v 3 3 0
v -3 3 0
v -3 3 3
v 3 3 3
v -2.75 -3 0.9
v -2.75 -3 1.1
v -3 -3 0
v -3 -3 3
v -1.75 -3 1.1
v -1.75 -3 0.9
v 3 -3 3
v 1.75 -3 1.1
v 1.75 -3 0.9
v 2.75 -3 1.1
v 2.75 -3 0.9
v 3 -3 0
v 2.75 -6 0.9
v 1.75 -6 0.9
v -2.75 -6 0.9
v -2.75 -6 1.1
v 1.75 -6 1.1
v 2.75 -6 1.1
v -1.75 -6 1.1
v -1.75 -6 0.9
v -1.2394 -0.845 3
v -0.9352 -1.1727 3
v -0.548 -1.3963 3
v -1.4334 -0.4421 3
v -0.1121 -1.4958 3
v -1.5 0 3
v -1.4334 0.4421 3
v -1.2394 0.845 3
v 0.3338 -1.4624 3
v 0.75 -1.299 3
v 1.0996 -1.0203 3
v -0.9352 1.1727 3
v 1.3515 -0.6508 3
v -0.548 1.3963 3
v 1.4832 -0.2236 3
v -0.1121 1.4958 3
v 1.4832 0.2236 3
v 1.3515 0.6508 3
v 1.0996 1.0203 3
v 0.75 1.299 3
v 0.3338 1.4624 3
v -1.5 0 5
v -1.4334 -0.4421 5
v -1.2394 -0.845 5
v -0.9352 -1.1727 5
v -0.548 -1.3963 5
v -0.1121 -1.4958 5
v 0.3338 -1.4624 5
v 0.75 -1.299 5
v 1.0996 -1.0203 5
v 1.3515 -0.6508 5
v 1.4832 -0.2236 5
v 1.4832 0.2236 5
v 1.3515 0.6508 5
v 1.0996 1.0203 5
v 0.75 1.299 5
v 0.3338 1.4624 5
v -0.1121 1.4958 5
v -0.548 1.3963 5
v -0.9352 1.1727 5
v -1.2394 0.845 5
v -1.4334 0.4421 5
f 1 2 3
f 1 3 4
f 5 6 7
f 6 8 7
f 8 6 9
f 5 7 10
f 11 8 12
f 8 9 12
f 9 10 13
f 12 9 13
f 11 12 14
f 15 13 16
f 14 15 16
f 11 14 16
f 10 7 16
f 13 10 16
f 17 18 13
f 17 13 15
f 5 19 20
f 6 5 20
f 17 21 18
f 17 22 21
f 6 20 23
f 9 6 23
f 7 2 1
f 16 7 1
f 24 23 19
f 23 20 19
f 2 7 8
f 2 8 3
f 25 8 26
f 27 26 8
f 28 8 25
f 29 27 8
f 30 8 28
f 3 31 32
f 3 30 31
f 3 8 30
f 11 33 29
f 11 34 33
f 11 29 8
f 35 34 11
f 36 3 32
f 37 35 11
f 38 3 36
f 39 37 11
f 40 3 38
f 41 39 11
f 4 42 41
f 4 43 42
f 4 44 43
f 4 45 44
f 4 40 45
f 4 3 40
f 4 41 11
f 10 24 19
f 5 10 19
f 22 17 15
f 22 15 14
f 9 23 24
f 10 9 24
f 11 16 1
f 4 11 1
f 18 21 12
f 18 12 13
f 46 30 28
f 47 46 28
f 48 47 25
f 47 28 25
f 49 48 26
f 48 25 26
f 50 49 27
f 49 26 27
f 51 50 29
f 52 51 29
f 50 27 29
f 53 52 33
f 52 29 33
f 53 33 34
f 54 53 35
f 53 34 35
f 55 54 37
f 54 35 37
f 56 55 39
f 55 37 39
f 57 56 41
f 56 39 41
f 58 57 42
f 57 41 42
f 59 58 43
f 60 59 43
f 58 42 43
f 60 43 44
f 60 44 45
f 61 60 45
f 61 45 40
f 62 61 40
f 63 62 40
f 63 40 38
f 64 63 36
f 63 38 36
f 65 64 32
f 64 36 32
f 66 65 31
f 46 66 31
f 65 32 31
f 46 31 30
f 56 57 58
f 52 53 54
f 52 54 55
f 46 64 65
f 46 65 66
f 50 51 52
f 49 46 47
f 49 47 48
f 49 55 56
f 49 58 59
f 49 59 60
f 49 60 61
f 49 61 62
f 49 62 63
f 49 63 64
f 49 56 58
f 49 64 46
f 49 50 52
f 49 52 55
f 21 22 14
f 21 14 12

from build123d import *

# Parameters (mm, degrees)
SKETCH_1_W      = 6
SKETCH_1_H      = 6
EXTRUDE_1_DEPTH = 3
SKETCH_2_R      = 1.5
EXTRUDE_2_DEPTH = 2
SKETCH_4_W      = 1
SKETCH_4_H      = 0.2


with BuildPart() as part:
    # 草图1 → 凸台-拉伸1 (new body)
    with BuildSketch(Plane.XY):
        Rectangle(SKETCH_1_W, SKETCH_1_H)
    extrude(amount=EXTRUDE_1_DEPTH)

    # 草图2 → 凸台-拉伸2 (add)
    with BuildSketch(Plane.XY.offset(3)):
        with Locations(Location((0, 0, 0), (0, 0, 180))):
            Circle(SKETCH_2_R)
    extrude(amount=EXTRUDE_2_DEPTH)

    # 扫描3: sweep along a path in 草图6
    with BuildLine(Plane(origin=(2.25, 0, 0), x_dir=(0, 0, -1), z_dir=(1, 0, 0))) as sweep_3_path:
        Line((-1.1, -3), (-1.1, -6))
    # 草图4 → 扫描3 (sweep)
    with BuildSketch(Plane.XZ.offset(3)):
        with Locations((2.25, 1)):
            Rectangle(SKETCH_4_W, SKETCH_4_H)
    sweep_3 = sweep(path=sweep_3_path.line)

    # 镜向1: 扫描3 across plane
    add(sweep_3.mirror(Plane(origin=(0, 0, 0), x_dir=(0, 0, 1), z_dir=(1, 0, 0))))


solid = part.part
